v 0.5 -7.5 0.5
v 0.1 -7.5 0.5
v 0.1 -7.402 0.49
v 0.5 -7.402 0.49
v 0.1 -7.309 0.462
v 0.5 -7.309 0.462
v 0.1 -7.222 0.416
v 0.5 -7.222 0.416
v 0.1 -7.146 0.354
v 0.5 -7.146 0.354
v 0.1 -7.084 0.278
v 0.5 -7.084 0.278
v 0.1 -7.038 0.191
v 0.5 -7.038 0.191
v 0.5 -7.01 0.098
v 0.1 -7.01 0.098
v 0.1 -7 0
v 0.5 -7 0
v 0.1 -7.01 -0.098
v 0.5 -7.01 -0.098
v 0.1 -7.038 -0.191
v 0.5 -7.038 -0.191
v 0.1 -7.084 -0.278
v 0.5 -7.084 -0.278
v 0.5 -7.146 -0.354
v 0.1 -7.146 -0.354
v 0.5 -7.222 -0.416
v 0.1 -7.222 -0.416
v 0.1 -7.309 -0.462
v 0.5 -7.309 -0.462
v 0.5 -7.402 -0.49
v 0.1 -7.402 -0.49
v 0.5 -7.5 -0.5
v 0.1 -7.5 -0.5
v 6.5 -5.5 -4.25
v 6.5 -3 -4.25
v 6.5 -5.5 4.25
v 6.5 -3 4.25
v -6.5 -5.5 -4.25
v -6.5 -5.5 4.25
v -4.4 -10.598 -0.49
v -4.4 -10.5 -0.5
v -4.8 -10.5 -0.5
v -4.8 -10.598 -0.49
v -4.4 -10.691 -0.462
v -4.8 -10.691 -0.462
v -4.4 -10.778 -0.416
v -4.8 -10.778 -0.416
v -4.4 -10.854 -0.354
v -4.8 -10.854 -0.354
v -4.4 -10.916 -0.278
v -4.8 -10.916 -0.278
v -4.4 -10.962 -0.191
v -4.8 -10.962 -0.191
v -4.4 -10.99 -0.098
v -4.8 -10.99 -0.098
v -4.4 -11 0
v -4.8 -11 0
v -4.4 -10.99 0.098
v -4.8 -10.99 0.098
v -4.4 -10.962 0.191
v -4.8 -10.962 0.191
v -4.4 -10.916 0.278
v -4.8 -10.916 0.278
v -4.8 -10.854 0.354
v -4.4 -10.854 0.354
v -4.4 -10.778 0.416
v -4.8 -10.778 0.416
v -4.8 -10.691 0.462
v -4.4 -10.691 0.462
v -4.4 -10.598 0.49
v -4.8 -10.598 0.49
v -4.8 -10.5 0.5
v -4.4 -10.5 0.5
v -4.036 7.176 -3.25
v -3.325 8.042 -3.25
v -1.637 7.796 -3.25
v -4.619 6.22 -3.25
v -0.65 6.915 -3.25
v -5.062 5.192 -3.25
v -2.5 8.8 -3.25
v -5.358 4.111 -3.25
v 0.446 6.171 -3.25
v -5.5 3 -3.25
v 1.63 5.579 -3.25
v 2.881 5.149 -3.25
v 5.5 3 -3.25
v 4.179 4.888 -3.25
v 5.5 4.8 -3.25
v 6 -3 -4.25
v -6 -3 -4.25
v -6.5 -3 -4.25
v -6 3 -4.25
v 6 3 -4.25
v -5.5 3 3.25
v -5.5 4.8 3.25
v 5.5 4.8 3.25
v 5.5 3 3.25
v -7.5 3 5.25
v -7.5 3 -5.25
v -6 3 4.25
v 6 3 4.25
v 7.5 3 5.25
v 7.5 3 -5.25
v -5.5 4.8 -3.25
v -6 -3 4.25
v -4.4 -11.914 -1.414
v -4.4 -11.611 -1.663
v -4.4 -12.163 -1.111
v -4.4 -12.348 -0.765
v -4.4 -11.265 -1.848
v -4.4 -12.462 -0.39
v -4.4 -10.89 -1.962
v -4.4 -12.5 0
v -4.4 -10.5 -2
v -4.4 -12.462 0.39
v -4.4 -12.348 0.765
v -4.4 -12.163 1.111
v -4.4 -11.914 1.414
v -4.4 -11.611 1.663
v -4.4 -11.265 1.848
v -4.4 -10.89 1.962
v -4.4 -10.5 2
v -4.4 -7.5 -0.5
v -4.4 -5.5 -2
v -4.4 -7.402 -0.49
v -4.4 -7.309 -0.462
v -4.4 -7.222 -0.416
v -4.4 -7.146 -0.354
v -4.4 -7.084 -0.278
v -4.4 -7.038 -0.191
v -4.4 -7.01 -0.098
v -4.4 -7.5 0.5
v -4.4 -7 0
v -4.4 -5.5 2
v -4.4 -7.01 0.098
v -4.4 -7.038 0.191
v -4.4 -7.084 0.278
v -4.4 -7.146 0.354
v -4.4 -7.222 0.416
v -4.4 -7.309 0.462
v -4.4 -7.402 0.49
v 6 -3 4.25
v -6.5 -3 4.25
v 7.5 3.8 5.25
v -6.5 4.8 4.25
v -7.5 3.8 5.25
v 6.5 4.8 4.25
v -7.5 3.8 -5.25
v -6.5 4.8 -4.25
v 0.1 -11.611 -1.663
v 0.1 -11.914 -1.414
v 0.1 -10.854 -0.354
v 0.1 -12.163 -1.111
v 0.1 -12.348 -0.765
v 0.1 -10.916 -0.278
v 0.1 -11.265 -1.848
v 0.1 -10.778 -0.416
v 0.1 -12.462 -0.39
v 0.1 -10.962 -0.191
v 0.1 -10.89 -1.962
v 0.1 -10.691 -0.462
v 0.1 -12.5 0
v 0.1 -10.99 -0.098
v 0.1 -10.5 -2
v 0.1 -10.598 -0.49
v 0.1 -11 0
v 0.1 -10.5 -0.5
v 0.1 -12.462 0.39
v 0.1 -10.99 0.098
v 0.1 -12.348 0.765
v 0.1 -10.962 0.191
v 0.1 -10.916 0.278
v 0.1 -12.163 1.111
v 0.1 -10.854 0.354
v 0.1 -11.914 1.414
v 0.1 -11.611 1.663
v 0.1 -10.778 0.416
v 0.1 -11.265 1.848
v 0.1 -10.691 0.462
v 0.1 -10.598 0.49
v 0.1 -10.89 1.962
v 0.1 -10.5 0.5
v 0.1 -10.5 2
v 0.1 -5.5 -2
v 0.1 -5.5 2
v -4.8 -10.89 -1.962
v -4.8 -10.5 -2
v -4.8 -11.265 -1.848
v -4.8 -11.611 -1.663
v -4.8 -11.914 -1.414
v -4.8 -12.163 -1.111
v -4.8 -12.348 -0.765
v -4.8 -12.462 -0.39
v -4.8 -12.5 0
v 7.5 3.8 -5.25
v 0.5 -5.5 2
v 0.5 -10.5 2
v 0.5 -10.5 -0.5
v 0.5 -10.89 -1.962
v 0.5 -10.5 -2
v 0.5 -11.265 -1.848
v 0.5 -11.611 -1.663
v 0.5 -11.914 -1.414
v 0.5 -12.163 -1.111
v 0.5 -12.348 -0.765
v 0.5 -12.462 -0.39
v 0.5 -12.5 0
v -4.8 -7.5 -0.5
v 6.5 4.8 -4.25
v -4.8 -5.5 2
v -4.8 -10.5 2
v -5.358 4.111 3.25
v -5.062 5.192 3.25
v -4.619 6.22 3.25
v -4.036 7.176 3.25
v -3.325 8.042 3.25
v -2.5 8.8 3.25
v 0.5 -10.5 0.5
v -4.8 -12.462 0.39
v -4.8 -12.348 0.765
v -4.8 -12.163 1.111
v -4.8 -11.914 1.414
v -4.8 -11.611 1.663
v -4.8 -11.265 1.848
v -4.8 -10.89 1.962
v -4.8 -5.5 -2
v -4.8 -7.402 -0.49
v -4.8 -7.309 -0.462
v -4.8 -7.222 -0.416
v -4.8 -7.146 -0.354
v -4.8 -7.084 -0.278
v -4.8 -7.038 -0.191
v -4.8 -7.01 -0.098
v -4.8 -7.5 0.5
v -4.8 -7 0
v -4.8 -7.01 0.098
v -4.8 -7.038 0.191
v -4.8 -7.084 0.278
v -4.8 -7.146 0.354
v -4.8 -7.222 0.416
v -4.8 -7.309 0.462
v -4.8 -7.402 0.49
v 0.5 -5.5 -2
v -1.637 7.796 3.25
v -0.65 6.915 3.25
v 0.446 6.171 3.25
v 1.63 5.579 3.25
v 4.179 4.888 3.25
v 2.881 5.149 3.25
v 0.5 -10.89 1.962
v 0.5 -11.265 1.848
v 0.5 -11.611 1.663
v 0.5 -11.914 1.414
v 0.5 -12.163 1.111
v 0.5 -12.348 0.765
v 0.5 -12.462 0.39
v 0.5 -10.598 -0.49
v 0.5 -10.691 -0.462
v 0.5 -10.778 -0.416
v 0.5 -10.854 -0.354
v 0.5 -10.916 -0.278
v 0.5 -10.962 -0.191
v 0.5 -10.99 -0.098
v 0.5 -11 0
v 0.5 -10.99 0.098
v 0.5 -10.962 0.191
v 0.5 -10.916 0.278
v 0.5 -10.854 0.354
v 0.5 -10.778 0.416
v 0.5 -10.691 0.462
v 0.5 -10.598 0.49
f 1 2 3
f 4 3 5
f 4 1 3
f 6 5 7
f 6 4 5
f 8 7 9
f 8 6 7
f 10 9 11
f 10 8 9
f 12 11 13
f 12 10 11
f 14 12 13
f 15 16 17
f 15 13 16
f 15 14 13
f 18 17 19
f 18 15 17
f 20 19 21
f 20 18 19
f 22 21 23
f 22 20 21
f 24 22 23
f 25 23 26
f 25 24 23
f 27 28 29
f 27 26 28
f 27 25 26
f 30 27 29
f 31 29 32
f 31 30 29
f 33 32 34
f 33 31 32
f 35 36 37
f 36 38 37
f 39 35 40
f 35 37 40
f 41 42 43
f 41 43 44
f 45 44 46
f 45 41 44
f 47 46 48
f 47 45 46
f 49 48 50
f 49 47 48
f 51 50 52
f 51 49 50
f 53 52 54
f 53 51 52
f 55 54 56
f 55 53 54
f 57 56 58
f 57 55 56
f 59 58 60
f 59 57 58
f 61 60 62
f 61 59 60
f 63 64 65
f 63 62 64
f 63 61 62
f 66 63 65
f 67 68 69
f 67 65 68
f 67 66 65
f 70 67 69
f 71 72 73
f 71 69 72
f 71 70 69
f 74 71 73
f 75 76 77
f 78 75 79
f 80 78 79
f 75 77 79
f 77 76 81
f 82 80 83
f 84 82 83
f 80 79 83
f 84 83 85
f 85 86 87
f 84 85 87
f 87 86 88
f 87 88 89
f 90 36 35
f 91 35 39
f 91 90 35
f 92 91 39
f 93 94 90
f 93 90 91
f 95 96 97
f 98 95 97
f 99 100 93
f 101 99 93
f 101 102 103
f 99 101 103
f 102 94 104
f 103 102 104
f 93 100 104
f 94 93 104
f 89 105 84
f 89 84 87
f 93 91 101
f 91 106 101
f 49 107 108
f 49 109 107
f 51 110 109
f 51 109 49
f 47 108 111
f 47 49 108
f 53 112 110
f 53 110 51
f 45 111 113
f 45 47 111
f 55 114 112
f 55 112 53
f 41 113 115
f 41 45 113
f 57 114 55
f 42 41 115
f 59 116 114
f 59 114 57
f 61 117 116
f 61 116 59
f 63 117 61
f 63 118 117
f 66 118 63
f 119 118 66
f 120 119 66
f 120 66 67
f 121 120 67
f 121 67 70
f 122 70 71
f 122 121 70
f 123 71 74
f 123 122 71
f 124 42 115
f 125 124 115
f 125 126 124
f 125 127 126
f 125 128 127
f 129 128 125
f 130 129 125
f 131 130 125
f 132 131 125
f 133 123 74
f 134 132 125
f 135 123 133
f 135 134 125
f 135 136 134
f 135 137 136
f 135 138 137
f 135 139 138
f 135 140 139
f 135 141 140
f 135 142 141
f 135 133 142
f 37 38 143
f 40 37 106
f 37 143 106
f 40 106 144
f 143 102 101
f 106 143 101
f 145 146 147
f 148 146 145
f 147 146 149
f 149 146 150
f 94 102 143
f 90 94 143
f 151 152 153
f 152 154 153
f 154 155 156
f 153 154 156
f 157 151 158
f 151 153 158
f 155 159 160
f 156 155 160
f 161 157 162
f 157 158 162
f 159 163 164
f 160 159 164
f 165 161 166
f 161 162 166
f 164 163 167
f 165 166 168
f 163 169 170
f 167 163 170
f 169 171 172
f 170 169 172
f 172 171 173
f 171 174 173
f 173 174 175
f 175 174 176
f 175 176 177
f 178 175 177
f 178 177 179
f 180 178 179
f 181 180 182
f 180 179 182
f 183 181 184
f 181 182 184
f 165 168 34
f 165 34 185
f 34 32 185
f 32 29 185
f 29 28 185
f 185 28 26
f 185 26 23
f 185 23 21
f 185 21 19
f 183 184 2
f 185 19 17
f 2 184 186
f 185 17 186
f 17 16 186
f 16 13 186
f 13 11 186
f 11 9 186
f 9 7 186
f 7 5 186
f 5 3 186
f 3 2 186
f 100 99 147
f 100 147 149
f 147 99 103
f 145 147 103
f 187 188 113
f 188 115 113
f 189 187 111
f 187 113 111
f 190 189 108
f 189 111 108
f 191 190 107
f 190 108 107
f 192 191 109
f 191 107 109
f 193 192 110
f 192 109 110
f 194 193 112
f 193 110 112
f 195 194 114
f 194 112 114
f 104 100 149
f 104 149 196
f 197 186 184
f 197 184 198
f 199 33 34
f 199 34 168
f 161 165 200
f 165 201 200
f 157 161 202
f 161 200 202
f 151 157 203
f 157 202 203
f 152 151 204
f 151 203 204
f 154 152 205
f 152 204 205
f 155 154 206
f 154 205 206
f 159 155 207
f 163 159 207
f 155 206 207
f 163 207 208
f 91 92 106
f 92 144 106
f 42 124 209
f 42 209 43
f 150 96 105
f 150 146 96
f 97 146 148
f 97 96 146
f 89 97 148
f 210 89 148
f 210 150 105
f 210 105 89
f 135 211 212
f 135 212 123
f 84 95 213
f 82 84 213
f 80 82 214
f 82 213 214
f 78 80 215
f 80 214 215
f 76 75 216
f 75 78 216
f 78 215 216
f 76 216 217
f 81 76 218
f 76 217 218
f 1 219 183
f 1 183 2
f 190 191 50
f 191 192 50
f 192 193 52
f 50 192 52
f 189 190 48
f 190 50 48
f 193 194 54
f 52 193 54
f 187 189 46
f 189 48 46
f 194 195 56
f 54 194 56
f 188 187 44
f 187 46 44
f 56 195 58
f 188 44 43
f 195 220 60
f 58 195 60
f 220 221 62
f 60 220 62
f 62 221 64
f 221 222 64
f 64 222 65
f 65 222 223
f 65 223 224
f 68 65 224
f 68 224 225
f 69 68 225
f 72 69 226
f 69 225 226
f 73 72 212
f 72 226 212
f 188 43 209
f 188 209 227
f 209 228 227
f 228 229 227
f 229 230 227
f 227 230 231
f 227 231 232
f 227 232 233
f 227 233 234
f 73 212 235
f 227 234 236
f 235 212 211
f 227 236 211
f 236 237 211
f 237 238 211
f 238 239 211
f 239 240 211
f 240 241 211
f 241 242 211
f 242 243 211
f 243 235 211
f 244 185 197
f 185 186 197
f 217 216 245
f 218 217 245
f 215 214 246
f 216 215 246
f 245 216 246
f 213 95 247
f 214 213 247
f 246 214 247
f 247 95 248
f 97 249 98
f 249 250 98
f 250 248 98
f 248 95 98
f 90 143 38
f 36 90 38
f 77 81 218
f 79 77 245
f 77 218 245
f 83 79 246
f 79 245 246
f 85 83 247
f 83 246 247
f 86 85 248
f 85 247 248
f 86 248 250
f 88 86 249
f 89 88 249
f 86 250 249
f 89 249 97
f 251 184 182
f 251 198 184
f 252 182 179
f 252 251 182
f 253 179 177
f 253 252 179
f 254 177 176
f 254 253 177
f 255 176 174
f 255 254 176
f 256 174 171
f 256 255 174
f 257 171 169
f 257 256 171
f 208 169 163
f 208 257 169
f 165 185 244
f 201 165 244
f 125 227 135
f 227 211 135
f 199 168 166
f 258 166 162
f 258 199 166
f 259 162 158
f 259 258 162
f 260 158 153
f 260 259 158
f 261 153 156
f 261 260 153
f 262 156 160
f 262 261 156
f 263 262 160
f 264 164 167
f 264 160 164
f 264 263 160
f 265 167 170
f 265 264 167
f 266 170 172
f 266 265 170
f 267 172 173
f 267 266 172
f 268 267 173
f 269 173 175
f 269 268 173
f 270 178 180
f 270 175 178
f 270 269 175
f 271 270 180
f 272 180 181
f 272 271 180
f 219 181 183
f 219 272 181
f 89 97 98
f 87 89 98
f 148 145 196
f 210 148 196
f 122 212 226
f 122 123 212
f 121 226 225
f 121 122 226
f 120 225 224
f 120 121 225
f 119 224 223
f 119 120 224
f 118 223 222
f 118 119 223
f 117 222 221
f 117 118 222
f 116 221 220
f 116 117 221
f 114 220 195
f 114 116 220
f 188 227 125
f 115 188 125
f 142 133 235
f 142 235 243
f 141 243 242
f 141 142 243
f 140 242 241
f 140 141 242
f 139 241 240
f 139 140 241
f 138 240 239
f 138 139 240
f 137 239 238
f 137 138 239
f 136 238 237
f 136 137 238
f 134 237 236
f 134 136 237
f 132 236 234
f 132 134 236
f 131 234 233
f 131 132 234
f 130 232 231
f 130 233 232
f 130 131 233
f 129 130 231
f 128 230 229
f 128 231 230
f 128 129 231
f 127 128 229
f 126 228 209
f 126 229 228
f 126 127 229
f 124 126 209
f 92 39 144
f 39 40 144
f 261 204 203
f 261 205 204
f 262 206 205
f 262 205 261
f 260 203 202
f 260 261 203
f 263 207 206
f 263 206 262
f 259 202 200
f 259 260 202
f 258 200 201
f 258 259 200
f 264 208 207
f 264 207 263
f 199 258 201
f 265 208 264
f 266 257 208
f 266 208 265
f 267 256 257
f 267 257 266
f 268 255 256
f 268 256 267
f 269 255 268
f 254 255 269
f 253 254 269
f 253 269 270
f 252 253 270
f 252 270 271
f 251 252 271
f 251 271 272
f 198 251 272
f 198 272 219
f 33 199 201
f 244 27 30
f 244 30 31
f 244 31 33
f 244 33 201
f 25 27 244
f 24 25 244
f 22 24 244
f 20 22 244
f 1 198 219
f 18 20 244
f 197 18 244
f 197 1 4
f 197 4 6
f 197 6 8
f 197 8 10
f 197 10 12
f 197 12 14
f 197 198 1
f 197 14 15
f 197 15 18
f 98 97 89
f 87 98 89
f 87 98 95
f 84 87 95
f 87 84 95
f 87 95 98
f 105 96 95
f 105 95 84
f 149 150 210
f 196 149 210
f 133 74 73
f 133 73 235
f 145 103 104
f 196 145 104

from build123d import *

# Parameters (mm, degrees)
SALIENTE_EXTRUIR1_DEPTH             = 4.25
CROQUIS2_W                          = 15
CROQUIS2_H                          = 10.5
SALIENTE_EXTRUIR2_DEPTH             = 1.8
CROQUIS3_W                          = 11
CROQUIS3_H                          = 6.5
CORTAR_EXTRUIR1_DEPTH               = 1.8
SALIENTE_EXTRUIR3_REACH             = 12.68
SALIENTE_EXTRUIR3_DIRECTION_2_REACH = 12.68
CROQUIS7_W                          = 0.4
CROQUIS7_H                          = 7
SALIENTE_EXTRUIR4_DEPTH             = 2
SALIENTE_EXTRUIR4_2_DEPTH           = 2
REDONDEO1_R                         = 2
REDONDEO2_R                         = 2
CORTAR_EXTRUIR2_DEPTH               = 16.742061491
CHAFL_N1_SIZE                       = 1


with BuildPart() as part:
    # Croquis1 → Saliente-Extruir1 (new, symmetric)
    with BuildSketch(Plane.XY):
        Polygon((6, -3), (6.5, -3), (6.5, -5.5), (-6.5, -5.5), (-6.5, -3), (-6, -3), (-6, 3), (6, 3), align=None)
    extrude(amount=SALIENTE_EXTRUIR1_DEPTH, both=True)

    # Croquis2 → Saliente-Extruir2 (add)
    with BuildSketch(Plane(origin=(0, 3, 0), x_dir=(1, 0, 0), z_dir=(0, 1, 0))):
        Rectangle(CROQUIS2_W, CROQUIS2_H)
    extrude(amount=SALIENTE_EXTRUIR2_DEPTH)

    # Croquis3 → Cortar-Extruir1 (cut)
    with BuildSketch(Plane(origin=(0, 4.8, 0), x_dir=(1, 0, 0), z_dir=(0, 1, 0))):
        Rectangle(CROQUIS3_W, CROQUIS3_H)
    extrude(amount=-CORTAR_EXTRUIR1_DEPTH, mode=Mode.SUBTRACT)


with BuildPart() as body_2:

    # Saliente-Extruir3: up to this face of the body (flat: up to its plane)
    saliente_extruir3_end = Plane(part.part.faces().sort_by_distance((0, 3.9, 3.25))[0])
    # Croquis4 → Saliente-Extruir3 (new, up to the picked face)
    with BuildSketch(Plane.XY, mode=Mode.PRIVATE) as saliente_extruir3_sk1:
        with BuildLine():
            Line((5.5, 3), (-5.5, 3))
            ThreePointArc((-5.5, 3), (-4.618711222, 6.220023046), (-2.5, 8.8))
            ThreePointArc((-2.5, 8.8), (1.027864045, 5.85572809), (5.5, 4.8))
            Line((5.5, 4.8), (5.5, 3))
        make_face()
    saliente_extruir3_tool1 = split(extrude(saliente_extruir3_sk1.sketch, amount=SALIENTE_EXTRUIR3_REACH, mode=Mode.PRIVATE), bisect_by=saliente_extruir3_end, keep=Keep.BOTH, mode=Mode.PRIVATE)
    add(saliente_extruir3_tool1.solids().sort_by(Axis((-0.768886, 4.883197, 0), (0, 0, 1)))[0])


    # Saliente-Extruir3 direction 2: up to this face of the body (flat: up to its plane)
    saliente_extruir3_direction_2_end = Plane(part.part.faces().sort_by_distance((0, 3.9, -3.25))[0])
    # Croquis4 → Saliente-Extruir3 direction 2 (add, up to the picked face)
    with BuildSketch(Plane.XY, mode=Mode.PRIVATE) as saliente_extruir3_direction_2_sk1:
        with BuildLine():
            Line((5.5, 3), (-5.5, 3))
            ThreePointArc((-5.5, 3), (-4.618711222, 6.220023046), (-2.5, 8.8))
            ThreePointArc((-2.5, 8.8), (1.027864045, 5.85572809), (5.5, 4.8))
            Line((5.5, 4.8), (5.5, 3))
        make_face()
    saliente_extruir3_direction_2_tool1 = split(extrude(saliente_extruir3_direction_2_sk1.sketch, amount=-SALIENTE_EXTRUIR3_DIRECTION_2_REACH, mode=Mode.PRIVATE), bisect_by=saliente_extruir3_direction_2_end, keep=Keep.BOTH, mode=Mode.PRIVATE)
    add(saliente_extruir3_direction_2_tool1.solids().sort_by(Axis((-0.768886, 4.883197, 0), (0, 0, -1)))[0])


with BuildPart() as body_3:
    # Croquis7 → Saliente-Extruir4 (new, symmetric)
    with BuildSketch(Plane.XY):
        with Locations((0.3, -9)):
            Rectangle(CROQUIS7_W, CROQUIS7_H)
    extrude(amount=SALIENTE_EXTRUIR4_DEPTH, both=True)

    # Redondeo2
    redondeo2_edges = [body_3.edges().sort_by_distance(p)[0] for p in [
        (0.3, -12.5, -2),
        (0.3, -12.5, 2),
    ]]
    fillet(redondeo2_edges, radius=REDONDEO2_R - 0.0001)  # a hair under: the kernel refuses the full size


with BuildPart() as body_4:
    # Croquis7 → Saliente-Extruir4 2 (new, symmetric)
    with BuildSketch(Plane.XY):
        with Locations((-4.6, -9)):
            Rectangle(CROQUIS7_W, CROQUIS7_H)
    extrude(amount=SALIENTE_EXTRUIR4_2_DEPTH, both=True)

    # Redondeo1
    redondeo1_edges = [body_4.edges().sort_by_distance(p)[0] for p in [
        (-4.6, -12.5, -2),
        (-4.6, -12.5, 2),
    ]]
    fillet(redondeo1_edges, radius=REDONDEO1_R - 0.0001)  # a hair under: the kernel refuses the full size


with BuildPart() as cortar_extruir2_tool:
    # Croquis9 → Cortar-Extruir2 (new, through all)
    with BuildSketch(Plane(origin=(0.5, 0, 0), x_dir=(0, 0, -1), z_dir=(1, 0, 0))):
        with BuildLine():
            Line((-0.5, -10.5), (-0.5, -7.5))
            ThreePointArc((-0.5, -7.5), (0, -7), (0.5, -7.5))
            Line((0.5, -7.5), (0.5, -10.5))
            ThreePointArc((0.5, -10.5), (0, -11), (-0.5, -10.5))
        make_face()
    extrude(amount=-CORTAR_EXTRUIR2_DEPTH)


with BuildPart() as body_3_1:
    add(body_3.part)

    # Cortar-Extruir2: cut by cortar_extruir2_tool
    add(cortar_extruir2_tool.part, mode=Mode.SUBTRACT)


with BuildPart() as body_4_1:
    add(body_4.part)

    # Cortar-Extruir2: cut by cortar_extruir2_tool
    add(cortar_extruir2_tool.part, mode=Mode.SUBTRACT)


with BuildPart() as part_1:
    add(part.part)

    # Chaflán1
    chafl_n1_edges = [part_1.edges().sort_by_distance(p)[0] for p in [
        (7.5, 4.8, 0),
        (0, 4.8, -5.25),
        (-7.5, 4.8, 0),
        (0, 4.8, 5.25),
    ]]
    chamfer(chafl_n1_edges, length=CHAFL_N1_SIZE)


solid = Compound([body_2.part, body_3_1.part, body_4_1.part, part_1.part])
